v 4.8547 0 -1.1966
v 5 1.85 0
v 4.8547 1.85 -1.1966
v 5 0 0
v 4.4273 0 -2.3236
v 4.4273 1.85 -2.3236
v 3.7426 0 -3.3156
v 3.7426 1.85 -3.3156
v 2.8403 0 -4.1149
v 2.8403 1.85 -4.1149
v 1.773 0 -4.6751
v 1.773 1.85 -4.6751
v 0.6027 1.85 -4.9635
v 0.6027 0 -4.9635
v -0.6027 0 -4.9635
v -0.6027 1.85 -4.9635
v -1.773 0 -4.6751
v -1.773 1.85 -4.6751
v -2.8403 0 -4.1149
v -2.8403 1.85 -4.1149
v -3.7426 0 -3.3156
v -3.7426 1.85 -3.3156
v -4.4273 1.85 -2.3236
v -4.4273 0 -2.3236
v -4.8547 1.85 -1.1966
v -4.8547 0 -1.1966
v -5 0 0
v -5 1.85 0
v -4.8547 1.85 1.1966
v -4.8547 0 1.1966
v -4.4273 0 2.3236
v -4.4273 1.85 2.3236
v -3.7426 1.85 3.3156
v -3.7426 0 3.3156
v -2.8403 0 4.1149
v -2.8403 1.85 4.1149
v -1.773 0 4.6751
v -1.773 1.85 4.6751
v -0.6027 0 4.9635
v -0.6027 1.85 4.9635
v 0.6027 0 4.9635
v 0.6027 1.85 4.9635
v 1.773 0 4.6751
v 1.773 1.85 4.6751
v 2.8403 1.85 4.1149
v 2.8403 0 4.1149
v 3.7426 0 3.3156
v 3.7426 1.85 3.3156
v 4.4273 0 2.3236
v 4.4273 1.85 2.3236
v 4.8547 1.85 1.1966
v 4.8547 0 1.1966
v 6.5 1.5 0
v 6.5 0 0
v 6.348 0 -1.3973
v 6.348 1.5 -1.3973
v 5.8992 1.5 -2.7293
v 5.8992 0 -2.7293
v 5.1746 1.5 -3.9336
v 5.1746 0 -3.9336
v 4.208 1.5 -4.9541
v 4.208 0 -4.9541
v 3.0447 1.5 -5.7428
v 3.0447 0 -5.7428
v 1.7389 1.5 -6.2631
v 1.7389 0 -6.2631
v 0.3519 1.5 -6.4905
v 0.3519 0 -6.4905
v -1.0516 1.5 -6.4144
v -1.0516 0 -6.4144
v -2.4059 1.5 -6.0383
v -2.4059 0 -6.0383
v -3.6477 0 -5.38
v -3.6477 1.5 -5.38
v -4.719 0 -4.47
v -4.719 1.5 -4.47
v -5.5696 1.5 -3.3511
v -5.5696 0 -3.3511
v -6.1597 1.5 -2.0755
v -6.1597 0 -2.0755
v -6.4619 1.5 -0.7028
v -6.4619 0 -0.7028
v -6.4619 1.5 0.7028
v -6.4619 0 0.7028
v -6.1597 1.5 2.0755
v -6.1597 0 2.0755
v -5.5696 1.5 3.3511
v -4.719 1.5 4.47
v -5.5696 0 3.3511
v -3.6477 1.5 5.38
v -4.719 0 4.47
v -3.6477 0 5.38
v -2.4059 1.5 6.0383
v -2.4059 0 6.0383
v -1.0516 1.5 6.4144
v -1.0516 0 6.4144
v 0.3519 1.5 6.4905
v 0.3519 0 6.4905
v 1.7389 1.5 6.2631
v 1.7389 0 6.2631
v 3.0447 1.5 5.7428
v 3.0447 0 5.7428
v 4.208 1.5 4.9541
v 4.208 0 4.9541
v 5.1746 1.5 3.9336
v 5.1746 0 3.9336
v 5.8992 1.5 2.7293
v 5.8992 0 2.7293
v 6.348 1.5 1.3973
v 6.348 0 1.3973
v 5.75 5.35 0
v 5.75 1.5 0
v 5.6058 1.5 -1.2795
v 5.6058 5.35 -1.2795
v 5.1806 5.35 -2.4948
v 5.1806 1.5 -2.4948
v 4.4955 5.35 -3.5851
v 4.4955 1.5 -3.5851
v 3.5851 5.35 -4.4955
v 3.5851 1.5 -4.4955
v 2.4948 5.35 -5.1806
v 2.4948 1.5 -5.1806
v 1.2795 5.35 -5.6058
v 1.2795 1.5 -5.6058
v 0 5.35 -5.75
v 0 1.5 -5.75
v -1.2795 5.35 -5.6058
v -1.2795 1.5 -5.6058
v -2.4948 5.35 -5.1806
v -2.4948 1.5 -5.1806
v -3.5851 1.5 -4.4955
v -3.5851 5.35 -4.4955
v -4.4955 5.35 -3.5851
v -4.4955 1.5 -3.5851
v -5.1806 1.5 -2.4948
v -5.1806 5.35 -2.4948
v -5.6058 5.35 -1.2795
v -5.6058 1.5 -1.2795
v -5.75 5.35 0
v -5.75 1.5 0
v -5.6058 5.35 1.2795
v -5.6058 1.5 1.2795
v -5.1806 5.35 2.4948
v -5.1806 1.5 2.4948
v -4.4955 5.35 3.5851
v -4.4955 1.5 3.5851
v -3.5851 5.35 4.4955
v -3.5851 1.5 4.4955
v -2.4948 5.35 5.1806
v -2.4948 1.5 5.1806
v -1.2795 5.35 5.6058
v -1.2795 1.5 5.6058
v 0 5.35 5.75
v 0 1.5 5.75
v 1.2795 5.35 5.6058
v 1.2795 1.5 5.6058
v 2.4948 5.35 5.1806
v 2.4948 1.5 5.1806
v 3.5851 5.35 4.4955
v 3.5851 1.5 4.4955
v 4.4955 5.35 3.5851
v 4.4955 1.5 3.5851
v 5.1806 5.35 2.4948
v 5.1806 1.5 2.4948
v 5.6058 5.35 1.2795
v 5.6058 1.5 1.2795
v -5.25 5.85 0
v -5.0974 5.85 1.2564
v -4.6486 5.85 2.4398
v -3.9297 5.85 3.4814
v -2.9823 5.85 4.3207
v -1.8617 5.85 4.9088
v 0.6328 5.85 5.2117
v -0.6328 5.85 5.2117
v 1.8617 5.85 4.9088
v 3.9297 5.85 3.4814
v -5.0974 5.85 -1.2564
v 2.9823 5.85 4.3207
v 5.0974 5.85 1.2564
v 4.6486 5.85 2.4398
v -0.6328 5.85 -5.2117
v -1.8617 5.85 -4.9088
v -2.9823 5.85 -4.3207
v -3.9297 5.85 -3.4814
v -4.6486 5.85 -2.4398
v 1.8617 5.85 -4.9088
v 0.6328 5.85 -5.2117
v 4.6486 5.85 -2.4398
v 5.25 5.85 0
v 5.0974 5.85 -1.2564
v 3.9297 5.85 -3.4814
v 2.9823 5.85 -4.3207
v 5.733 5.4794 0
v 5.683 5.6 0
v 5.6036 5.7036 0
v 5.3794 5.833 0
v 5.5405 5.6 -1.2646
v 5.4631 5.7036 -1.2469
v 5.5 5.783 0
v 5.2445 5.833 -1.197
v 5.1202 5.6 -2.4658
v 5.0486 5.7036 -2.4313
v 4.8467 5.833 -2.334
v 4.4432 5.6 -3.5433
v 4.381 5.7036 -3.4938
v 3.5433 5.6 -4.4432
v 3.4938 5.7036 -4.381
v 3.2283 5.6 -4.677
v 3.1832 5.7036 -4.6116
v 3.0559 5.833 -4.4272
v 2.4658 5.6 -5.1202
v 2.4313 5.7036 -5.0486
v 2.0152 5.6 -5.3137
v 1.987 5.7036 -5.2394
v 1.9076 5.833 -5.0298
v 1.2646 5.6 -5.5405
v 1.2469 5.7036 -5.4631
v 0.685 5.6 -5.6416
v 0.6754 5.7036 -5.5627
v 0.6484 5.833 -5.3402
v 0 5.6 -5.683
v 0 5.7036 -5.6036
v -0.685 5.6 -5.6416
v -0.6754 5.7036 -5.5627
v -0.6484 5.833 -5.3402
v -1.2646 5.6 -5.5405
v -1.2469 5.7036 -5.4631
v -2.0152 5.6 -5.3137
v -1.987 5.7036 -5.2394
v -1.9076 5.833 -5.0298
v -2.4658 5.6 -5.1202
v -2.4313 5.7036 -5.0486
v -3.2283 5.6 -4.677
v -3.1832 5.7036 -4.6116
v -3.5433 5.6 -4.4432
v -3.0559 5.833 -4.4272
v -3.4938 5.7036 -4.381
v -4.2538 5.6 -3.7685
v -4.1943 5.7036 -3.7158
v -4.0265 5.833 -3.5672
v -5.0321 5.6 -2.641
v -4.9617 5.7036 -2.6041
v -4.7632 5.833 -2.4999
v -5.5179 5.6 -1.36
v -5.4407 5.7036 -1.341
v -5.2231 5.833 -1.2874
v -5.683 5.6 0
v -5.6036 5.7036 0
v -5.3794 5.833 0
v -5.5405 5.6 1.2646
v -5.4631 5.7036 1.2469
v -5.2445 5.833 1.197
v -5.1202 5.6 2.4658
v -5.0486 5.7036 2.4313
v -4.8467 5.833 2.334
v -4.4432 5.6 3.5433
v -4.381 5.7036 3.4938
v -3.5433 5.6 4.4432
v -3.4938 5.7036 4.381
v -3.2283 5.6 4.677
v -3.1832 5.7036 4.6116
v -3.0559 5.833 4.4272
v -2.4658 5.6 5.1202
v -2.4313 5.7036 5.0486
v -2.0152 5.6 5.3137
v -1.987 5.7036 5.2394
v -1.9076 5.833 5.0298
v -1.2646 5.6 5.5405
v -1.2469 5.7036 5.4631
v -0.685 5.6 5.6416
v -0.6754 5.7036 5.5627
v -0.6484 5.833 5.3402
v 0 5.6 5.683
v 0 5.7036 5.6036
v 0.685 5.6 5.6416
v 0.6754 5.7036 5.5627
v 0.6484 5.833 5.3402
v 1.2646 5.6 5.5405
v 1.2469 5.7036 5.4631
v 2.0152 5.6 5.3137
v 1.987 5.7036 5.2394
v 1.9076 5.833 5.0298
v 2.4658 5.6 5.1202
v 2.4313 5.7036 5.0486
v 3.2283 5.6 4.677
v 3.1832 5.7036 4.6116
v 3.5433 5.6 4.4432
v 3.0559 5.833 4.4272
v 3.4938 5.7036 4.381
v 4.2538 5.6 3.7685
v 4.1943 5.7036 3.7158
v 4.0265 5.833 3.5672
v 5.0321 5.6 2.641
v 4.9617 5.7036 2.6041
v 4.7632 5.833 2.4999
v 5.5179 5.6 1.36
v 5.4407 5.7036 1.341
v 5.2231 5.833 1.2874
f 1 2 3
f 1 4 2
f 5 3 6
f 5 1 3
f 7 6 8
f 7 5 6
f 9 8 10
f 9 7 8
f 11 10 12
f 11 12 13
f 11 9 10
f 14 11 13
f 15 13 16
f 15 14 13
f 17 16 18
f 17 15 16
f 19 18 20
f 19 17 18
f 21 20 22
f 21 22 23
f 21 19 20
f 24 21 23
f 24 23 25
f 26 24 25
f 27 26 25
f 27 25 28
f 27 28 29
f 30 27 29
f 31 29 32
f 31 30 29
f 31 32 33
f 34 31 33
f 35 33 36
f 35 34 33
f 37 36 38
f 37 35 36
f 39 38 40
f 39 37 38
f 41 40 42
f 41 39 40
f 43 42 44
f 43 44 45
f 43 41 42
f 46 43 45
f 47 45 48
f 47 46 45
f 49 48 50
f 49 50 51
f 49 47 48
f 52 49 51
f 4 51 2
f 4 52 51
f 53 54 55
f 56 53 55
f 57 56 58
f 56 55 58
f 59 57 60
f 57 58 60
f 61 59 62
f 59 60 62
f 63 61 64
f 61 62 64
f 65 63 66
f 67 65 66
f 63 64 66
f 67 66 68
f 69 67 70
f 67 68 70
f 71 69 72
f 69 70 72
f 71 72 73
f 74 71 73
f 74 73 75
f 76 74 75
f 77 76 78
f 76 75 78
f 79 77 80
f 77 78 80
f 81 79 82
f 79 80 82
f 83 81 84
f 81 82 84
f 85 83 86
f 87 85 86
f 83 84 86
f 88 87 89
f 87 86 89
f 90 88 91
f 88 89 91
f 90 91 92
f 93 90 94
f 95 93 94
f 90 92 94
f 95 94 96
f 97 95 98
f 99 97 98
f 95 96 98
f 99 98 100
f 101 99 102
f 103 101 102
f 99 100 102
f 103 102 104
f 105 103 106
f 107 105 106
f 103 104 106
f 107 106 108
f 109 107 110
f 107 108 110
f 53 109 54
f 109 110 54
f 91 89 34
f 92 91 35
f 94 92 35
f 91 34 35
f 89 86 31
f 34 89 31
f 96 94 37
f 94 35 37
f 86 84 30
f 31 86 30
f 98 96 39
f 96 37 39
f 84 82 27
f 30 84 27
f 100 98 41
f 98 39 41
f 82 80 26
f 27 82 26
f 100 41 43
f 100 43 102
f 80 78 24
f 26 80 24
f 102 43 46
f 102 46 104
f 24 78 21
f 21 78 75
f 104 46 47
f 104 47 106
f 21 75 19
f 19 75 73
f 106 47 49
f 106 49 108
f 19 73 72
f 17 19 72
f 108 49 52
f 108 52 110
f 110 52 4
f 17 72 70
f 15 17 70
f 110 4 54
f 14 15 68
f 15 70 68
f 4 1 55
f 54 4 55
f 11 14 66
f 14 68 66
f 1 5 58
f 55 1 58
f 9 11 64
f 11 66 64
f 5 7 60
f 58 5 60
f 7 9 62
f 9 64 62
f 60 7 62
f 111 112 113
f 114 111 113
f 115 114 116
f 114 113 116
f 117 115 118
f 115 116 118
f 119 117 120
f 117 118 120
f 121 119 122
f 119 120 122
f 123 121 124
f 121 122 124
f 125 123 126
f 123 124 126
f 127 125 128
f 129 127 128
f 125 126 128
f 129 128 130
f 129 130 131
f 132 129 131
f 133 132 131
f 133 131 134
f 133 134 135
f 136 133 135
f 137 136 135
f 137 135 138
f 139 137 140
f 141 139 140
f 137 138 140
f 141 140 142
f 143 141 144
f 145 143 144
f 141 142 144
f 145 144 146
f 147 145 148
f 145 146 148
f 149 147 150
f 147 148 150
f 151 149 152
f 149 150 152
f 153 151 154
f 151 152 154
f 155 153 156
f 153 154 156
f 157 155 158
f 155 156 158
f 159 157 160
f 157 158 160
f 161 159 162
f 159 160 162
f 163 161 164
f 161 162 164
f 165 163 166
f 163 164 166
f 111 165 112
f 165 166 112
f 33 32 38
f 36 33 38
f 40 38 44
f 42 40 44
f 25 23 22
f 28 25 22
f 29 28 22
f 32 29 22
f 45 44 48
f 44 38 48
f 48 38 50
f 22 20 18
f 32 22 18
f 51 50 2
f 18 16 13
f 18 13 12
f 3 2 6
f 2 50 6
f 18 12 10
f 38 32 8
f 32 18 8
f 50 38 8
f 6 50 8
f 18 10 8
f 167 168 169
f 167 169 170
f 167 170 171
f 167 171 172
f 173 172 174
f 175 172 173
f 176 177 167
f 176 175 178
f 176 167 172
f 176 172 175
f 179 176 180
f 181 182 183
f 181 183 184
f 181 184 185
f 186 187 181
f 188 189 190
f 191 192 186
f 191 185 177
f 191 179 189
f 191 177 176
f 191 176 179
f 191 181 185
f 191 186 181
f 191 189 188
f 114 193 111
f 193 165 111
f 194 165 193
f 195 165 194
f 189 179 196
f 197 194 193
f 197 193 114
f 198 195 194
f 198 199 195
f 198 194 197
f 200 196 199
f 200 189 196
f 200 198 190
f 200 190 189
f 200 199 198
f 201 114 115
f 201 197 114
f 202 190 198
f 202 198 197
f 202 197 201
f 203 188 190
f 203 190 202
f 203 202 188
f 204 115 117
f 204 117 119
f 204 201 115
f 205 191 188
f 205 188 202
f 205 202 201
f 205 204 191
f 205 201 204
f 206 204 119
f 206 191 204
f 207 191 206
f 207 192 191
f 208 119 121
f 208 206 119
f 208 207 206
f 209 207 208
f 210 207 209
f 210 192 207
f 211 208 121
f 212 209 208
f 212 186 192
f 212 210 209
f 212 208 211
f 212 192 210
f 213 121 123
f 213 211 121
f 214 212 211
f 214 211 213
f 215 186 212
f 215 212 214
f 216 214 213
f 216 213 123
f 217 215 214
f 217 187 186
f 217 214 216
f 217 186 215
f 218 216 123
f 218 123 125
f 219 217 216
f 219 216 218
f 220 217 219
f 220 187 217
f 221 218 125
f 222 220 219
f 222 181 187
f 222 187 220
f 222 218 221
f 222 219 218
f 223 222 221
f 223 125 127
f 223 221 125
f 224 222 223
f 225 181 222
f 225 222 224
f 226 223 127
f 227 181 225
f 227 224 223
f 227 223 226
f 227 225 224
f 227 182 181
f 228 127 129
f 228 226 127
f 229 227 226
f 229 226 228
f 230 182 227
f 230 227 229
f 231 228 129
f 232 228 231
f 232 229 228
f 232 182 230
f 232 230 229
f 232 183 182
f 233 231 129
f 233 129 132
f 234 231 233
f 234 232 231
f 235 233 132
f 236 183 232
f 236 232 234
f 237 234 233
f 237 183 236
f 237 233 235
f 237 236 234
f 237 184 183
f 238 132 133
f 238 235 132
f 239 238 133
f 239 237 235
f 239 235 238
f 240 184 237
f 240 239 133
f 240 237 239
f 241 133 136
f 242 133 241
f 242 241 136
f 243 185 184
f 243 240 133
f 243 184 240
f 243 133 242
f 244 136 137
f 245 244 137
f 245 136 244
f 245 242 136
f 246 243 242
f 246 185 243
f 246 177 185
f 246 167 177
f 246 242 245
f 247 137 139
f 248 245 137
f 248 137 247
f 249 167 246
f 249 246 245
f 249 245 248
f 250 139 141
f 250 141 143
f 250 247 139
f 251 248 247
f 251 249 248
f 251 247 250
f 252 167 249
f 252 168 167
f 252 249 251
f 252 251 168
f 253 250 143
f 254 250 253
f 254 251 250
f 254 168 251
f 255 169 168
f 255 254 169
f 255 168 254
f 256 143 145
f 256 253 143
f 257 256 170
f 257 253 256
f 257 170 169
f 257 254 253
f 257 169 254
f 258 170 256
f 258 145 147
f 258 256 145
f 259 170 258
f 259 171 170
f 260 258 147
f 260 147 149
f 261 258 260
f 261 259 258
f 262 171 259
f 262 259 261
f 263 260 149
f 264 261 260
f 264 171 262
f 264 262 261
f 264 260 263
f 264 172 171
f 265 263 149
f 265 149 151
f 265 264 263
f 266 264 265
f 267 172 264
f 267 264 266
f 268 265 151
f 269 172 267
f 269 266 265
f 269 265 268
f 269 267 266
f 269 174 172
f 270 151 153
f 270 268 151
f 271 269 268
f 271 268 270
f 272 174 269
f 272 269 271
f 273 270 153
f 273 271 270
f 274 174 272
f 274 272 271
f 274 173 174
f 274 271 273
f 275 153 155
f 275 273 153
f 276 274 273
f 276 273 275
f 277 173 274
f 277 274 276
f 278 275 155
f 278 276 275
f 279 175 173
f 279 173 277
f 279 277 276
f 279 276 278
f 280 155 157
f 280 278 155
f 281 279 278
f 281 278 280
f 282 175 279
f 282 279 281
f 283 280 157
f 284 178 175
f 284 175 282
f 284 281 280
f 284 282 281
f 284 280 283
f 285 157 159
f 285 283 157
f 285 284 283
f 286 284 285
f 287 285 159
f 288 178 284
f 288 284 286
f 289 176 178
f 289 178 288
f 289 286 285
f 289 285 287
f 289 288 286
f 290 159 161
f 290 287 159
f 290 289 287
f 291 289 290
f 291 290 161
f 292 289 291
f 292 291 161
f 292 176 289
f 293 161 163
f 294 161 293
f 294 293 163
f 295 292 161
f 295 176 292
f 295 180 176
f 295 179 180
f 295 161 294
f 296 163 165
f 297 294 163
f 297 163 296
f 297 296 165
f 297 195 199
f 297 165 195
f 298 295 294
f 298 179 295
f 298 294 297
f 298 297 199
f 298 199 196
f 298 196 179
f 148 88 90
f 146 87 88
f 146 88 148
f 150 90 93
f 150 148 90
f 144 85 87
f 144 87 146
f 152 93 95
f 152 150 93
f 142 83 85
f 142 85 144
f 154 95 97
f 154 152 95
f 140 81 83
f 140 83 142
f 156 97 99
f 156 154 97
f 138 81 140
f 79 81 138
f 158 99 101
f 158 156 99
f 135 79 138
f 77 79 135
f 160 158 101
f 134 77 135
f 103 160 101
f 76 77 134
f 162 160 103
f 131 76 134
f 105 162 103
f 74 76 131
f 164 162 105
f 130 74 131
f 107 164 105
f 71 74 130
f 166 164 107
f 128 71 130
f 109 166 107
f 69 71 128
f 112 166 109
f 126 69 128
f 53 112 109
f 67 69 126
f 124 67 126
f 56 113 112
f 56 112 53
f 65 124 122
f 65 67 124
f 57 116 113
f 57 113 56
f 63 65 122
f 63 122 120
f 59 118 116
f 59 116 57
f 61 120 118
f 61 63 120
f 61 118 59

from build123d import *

# Parameters (mm, degrees)
SKETCH1_R           = 6.5
SKETCH1_R_2         = 5
BOSS_EXTRUDE1_DEPTH = 1.5
SKETCH2_R           = 5.75
SKETCH2_R_2         = 5
BOSS_EXTRUDE2_DEPTH = 4.35
FILLET1_R           = 0.5
SKETCH3_R           = 5
BOSS_EXTRUDE3_DEPTH = 4


with BuildPart() as part:
    # Sketch1 → Boss-Extrude1 (new body)
    with BuildSketch(Plane(origin=(0, 0, 0), x_dir=(1, 0, 0), z_dir=(0, 1, 0))):
        Circle(SKETCH1_R)
        Circle(SKETCH1_R_2, mode=Mode.SUBTRACT)
    extrude(amount=BOSS_EXTRUDE1_DEPTH)

    # Sketch2 → Boss-Extrude2 (add)
    with BuildSketch(Plane(origin=(0, 1.5, 0), x_dir=(1, 0, 0), z_dir=(0, 1, 0))):
        Circle(SKETCH2_R)
        Circle(SKETCH2_R_2, mode=Mode.SUBTRACT)
    extrude(amount=BOSS_EXTRUDE2_DEPTH)

    # Fillet1
    fillet1_edges = [part.edges().sort_by_distance(p)[0] for p in [
        (-5.75, 5.85, 0),
    ]]
    fillet(fillet1_edges, radius=FILLET1_R)

    # Sketch3 → Boss-Extrude3 (add)
    with BuildSketch(Plane(origin=(0, 5.85, 0), x_dir=(1, 0, 0), z_dir=(0, 1, 0))):
        Circle(SKETCH3_R)
    extrude(amount=-BOSS_EXTRUDE3_DEPTH)


solid = part.part
